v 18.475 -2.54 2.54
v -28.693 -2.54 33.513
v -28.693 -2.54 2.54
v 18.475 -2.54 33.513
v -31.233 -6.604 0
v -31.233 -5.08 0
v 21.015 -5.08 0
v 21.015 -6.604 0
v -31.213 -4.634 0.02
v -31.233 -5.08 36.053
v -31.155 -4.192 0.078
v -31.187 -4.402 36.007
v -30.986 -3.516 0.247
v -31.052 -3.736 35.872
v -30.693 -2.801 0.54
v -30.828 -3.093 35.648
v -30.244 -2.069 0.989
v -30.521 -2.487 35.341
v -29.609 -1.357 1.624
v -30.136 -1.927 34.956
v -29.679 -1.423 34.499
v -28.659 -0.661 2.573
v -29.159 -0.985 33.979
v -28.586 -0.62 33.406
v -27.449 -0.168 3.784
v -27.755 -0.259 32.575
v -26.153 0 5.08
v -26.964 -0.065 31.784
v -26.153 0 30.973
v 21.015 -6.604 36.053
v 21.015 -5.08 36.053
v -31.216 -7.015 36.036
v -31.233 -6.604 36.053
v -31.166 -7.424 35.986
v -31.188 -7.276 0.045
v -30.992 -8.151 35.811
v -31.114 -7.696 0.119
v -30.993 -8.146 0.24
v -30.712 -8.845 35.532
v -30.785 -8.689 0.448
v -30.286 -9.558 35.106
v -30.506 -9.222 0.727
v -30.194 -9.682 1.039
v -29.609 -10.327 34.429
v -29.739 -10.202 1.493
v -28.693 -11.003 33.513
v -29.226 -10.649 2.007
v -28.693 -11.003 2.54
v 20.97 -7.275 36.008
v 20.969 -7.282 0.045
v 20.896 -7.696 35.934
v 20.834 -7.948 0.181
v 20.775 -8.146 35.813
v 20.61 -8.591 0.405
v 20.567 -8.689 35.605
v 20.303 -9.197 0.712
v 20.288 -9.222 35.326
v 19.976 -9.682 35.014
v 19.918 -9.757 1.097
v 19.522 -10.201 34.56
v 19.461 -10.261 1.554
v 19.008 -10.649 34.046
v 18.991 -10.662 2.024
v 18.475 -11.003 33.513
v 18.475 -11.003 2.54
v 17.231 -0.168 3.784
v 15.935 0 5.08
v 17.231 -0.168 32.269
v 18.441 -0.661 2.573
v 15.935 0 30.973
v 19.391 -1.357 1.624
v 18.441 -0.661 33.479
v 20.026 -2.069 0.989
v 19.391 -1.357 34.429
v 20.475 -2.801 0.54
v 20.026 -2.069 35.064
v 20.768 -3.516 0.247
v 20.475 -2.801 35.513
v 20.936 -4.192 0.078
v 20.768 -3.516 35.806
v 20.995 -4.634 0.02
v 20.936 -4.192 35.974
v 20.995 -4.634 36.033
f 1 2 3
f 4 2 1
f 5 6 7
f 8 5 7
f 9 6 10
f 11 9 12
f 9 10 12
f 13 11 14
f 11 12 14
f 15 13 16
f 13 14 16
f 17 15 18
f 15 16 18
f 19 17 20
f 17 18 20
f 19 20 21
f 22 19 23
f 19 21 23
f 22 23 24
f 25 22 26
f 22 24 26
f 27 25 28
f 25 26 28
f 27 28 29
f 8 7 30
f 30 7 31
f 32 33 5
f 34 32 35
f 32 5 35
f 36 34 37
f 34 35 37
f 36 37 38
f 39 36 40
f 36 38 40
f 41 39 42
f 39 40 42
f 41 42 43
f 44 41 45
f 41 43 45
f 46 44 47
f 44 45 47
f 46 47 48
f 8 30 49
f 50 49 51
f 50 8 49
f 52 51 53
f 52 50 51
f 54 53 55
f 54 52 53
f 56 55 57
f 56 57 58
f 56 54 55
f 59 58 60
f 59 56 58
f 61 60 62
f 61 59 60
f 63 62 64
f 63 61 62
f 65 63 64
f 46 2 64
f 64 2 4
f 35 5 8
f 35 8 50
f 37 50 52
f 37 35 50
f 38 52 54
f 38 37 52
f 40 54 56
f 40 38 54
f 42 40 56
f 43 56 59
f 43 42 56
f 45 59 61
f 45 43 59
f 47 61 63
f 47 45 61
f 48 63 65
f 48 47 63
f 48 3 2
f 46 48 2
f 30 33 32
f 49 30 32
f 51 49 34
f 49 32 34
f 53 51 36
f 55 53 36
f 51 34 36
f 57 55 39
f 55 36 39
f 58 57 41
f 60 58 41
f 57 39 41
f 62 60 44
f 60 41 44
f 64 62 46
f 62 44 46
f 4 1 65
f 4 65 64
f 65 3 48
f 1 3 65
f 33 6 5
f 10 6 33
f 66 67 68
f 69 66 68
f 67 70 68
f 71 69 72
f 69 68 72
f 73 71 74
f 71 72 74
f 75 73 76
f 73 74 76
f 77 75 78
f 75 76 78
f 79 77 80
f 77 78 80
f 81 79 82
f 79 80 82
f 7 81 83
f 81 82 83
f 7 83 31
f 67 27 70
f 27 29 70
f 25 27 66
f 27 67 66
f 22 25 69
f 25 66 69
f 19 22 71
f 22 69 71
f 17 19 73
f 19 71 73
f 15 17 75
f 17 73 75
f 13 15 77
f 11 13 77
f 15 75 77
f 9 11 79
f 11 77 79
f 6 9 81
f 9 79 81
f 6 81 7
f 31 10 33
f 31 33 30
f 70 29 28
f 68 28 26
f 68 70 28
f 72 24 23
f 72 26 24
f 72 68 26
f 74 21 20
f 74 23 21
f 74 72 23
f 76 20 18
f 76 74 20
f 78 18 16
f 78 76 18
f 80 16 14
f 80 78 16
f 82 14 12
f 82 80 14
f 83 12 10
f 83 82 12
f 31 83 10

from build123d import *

# Parameters (mm, degrees)
F0_W        = 52.2474944592
F0_H        = 36.0527001321
F1_DEPTH    = 11.684
F2_T        = -2.54
F3_T1_DEPTH = 61.4527001321
F3_T3_DEPTH = 77.6474944592
F4_R        = 5.08


# Not quite as in the source:
# - a fillet or chamfer that OpenCascade refuses, or shapes differently, is made with other operations: its cross-section is extruded or revolved along the edge and cut away or added


with BuildPart() as f1:
    # F0 (on Front) → F1 (new body)
    with BuildSketch(Plane.XZ):
        with Locations((-5.1090717316, 18.0263500661)):
            Rectangle(F0_W, F0_H)
    extrude(amount=F1_DEPTH)

    # F2
    f2_openings = [f1.faces().sort_by_distance(p)[0] for p in [
        (-5.109072, -11.684, 18.02635),
    ]]
    offset(amount=F2_T, openings=f2_openings)

    # F3: fillet of radius 5.08 on 4 edges, made by hand

    # F3_s2 → F3_t1 (cut)
    with BuildSketch(Plane.XY.offset(-12.7)):
        with BuildLine():
            ThreePointArc((21.014675498, -6.604), (19.5267779464, -10.1961024484), (15.934675498, -11.684))
            Line((15.934675498, -11.684), (21.014675498, -11.684))
            Line((21.014675498, -11.684), (21.014675498, -6.604))
        make_face()
        with BuildLine():
            ThreePointArc((-31.2328189611, -6.604), (-29.7449214096, -10.1961024484), (-26.1528189611, -11.684))
            Line((-26.1528189611, -11.684), (-31.2328189611, -11.684))
            Line((-31.2328189611, -11.684), (-31.2328189611, -6.604))
        make_face()
    extrude(amount=F3_T1_DEPTH, mode=Mode.SUBTRACT)

    # F3_s4 → F3_t3 (cut)
    with BuildSketch(Plane.YZ.offset(-43.9328189611)):
        with BuildLine():
            ThreePointArc((-6.604, 36.0527001321), (-10.1961024484, 34.5648025806), (-11.684, 30.9727001321))
            Line((-11.684, 30.9727001321), (-11.684, 36.0527001321))
            Line((-11.684, 36.0527001321), (-6.604, 36.0527001321))
        make_face()
        with BuildLine():
            ThreePointArc((-6.604, 0), (-10.1961024484, 1.4878975516), (-11.684, 5.08))
            Line((-11.684, 5.08), (-11.684, 0))
            Line((-11.684, 0), (-6.604, 0))
        make_face()
    extrude(amount=F3_T3_DEPTH, mode=Mode.SUBTRACT)

    # F4
    f4_edges = [f1.edges().sort_by_distance(p)[0] for p in [
        (-5.109072, 0, 0),
        (-31.232819, 0, 18.02635),
        (-5.109072, 0, 36.0527),
        (21.014675, 0, 18.02635),
    ]]
    fillet(f4_edges, radius=F4_R)


solid = f1.part
